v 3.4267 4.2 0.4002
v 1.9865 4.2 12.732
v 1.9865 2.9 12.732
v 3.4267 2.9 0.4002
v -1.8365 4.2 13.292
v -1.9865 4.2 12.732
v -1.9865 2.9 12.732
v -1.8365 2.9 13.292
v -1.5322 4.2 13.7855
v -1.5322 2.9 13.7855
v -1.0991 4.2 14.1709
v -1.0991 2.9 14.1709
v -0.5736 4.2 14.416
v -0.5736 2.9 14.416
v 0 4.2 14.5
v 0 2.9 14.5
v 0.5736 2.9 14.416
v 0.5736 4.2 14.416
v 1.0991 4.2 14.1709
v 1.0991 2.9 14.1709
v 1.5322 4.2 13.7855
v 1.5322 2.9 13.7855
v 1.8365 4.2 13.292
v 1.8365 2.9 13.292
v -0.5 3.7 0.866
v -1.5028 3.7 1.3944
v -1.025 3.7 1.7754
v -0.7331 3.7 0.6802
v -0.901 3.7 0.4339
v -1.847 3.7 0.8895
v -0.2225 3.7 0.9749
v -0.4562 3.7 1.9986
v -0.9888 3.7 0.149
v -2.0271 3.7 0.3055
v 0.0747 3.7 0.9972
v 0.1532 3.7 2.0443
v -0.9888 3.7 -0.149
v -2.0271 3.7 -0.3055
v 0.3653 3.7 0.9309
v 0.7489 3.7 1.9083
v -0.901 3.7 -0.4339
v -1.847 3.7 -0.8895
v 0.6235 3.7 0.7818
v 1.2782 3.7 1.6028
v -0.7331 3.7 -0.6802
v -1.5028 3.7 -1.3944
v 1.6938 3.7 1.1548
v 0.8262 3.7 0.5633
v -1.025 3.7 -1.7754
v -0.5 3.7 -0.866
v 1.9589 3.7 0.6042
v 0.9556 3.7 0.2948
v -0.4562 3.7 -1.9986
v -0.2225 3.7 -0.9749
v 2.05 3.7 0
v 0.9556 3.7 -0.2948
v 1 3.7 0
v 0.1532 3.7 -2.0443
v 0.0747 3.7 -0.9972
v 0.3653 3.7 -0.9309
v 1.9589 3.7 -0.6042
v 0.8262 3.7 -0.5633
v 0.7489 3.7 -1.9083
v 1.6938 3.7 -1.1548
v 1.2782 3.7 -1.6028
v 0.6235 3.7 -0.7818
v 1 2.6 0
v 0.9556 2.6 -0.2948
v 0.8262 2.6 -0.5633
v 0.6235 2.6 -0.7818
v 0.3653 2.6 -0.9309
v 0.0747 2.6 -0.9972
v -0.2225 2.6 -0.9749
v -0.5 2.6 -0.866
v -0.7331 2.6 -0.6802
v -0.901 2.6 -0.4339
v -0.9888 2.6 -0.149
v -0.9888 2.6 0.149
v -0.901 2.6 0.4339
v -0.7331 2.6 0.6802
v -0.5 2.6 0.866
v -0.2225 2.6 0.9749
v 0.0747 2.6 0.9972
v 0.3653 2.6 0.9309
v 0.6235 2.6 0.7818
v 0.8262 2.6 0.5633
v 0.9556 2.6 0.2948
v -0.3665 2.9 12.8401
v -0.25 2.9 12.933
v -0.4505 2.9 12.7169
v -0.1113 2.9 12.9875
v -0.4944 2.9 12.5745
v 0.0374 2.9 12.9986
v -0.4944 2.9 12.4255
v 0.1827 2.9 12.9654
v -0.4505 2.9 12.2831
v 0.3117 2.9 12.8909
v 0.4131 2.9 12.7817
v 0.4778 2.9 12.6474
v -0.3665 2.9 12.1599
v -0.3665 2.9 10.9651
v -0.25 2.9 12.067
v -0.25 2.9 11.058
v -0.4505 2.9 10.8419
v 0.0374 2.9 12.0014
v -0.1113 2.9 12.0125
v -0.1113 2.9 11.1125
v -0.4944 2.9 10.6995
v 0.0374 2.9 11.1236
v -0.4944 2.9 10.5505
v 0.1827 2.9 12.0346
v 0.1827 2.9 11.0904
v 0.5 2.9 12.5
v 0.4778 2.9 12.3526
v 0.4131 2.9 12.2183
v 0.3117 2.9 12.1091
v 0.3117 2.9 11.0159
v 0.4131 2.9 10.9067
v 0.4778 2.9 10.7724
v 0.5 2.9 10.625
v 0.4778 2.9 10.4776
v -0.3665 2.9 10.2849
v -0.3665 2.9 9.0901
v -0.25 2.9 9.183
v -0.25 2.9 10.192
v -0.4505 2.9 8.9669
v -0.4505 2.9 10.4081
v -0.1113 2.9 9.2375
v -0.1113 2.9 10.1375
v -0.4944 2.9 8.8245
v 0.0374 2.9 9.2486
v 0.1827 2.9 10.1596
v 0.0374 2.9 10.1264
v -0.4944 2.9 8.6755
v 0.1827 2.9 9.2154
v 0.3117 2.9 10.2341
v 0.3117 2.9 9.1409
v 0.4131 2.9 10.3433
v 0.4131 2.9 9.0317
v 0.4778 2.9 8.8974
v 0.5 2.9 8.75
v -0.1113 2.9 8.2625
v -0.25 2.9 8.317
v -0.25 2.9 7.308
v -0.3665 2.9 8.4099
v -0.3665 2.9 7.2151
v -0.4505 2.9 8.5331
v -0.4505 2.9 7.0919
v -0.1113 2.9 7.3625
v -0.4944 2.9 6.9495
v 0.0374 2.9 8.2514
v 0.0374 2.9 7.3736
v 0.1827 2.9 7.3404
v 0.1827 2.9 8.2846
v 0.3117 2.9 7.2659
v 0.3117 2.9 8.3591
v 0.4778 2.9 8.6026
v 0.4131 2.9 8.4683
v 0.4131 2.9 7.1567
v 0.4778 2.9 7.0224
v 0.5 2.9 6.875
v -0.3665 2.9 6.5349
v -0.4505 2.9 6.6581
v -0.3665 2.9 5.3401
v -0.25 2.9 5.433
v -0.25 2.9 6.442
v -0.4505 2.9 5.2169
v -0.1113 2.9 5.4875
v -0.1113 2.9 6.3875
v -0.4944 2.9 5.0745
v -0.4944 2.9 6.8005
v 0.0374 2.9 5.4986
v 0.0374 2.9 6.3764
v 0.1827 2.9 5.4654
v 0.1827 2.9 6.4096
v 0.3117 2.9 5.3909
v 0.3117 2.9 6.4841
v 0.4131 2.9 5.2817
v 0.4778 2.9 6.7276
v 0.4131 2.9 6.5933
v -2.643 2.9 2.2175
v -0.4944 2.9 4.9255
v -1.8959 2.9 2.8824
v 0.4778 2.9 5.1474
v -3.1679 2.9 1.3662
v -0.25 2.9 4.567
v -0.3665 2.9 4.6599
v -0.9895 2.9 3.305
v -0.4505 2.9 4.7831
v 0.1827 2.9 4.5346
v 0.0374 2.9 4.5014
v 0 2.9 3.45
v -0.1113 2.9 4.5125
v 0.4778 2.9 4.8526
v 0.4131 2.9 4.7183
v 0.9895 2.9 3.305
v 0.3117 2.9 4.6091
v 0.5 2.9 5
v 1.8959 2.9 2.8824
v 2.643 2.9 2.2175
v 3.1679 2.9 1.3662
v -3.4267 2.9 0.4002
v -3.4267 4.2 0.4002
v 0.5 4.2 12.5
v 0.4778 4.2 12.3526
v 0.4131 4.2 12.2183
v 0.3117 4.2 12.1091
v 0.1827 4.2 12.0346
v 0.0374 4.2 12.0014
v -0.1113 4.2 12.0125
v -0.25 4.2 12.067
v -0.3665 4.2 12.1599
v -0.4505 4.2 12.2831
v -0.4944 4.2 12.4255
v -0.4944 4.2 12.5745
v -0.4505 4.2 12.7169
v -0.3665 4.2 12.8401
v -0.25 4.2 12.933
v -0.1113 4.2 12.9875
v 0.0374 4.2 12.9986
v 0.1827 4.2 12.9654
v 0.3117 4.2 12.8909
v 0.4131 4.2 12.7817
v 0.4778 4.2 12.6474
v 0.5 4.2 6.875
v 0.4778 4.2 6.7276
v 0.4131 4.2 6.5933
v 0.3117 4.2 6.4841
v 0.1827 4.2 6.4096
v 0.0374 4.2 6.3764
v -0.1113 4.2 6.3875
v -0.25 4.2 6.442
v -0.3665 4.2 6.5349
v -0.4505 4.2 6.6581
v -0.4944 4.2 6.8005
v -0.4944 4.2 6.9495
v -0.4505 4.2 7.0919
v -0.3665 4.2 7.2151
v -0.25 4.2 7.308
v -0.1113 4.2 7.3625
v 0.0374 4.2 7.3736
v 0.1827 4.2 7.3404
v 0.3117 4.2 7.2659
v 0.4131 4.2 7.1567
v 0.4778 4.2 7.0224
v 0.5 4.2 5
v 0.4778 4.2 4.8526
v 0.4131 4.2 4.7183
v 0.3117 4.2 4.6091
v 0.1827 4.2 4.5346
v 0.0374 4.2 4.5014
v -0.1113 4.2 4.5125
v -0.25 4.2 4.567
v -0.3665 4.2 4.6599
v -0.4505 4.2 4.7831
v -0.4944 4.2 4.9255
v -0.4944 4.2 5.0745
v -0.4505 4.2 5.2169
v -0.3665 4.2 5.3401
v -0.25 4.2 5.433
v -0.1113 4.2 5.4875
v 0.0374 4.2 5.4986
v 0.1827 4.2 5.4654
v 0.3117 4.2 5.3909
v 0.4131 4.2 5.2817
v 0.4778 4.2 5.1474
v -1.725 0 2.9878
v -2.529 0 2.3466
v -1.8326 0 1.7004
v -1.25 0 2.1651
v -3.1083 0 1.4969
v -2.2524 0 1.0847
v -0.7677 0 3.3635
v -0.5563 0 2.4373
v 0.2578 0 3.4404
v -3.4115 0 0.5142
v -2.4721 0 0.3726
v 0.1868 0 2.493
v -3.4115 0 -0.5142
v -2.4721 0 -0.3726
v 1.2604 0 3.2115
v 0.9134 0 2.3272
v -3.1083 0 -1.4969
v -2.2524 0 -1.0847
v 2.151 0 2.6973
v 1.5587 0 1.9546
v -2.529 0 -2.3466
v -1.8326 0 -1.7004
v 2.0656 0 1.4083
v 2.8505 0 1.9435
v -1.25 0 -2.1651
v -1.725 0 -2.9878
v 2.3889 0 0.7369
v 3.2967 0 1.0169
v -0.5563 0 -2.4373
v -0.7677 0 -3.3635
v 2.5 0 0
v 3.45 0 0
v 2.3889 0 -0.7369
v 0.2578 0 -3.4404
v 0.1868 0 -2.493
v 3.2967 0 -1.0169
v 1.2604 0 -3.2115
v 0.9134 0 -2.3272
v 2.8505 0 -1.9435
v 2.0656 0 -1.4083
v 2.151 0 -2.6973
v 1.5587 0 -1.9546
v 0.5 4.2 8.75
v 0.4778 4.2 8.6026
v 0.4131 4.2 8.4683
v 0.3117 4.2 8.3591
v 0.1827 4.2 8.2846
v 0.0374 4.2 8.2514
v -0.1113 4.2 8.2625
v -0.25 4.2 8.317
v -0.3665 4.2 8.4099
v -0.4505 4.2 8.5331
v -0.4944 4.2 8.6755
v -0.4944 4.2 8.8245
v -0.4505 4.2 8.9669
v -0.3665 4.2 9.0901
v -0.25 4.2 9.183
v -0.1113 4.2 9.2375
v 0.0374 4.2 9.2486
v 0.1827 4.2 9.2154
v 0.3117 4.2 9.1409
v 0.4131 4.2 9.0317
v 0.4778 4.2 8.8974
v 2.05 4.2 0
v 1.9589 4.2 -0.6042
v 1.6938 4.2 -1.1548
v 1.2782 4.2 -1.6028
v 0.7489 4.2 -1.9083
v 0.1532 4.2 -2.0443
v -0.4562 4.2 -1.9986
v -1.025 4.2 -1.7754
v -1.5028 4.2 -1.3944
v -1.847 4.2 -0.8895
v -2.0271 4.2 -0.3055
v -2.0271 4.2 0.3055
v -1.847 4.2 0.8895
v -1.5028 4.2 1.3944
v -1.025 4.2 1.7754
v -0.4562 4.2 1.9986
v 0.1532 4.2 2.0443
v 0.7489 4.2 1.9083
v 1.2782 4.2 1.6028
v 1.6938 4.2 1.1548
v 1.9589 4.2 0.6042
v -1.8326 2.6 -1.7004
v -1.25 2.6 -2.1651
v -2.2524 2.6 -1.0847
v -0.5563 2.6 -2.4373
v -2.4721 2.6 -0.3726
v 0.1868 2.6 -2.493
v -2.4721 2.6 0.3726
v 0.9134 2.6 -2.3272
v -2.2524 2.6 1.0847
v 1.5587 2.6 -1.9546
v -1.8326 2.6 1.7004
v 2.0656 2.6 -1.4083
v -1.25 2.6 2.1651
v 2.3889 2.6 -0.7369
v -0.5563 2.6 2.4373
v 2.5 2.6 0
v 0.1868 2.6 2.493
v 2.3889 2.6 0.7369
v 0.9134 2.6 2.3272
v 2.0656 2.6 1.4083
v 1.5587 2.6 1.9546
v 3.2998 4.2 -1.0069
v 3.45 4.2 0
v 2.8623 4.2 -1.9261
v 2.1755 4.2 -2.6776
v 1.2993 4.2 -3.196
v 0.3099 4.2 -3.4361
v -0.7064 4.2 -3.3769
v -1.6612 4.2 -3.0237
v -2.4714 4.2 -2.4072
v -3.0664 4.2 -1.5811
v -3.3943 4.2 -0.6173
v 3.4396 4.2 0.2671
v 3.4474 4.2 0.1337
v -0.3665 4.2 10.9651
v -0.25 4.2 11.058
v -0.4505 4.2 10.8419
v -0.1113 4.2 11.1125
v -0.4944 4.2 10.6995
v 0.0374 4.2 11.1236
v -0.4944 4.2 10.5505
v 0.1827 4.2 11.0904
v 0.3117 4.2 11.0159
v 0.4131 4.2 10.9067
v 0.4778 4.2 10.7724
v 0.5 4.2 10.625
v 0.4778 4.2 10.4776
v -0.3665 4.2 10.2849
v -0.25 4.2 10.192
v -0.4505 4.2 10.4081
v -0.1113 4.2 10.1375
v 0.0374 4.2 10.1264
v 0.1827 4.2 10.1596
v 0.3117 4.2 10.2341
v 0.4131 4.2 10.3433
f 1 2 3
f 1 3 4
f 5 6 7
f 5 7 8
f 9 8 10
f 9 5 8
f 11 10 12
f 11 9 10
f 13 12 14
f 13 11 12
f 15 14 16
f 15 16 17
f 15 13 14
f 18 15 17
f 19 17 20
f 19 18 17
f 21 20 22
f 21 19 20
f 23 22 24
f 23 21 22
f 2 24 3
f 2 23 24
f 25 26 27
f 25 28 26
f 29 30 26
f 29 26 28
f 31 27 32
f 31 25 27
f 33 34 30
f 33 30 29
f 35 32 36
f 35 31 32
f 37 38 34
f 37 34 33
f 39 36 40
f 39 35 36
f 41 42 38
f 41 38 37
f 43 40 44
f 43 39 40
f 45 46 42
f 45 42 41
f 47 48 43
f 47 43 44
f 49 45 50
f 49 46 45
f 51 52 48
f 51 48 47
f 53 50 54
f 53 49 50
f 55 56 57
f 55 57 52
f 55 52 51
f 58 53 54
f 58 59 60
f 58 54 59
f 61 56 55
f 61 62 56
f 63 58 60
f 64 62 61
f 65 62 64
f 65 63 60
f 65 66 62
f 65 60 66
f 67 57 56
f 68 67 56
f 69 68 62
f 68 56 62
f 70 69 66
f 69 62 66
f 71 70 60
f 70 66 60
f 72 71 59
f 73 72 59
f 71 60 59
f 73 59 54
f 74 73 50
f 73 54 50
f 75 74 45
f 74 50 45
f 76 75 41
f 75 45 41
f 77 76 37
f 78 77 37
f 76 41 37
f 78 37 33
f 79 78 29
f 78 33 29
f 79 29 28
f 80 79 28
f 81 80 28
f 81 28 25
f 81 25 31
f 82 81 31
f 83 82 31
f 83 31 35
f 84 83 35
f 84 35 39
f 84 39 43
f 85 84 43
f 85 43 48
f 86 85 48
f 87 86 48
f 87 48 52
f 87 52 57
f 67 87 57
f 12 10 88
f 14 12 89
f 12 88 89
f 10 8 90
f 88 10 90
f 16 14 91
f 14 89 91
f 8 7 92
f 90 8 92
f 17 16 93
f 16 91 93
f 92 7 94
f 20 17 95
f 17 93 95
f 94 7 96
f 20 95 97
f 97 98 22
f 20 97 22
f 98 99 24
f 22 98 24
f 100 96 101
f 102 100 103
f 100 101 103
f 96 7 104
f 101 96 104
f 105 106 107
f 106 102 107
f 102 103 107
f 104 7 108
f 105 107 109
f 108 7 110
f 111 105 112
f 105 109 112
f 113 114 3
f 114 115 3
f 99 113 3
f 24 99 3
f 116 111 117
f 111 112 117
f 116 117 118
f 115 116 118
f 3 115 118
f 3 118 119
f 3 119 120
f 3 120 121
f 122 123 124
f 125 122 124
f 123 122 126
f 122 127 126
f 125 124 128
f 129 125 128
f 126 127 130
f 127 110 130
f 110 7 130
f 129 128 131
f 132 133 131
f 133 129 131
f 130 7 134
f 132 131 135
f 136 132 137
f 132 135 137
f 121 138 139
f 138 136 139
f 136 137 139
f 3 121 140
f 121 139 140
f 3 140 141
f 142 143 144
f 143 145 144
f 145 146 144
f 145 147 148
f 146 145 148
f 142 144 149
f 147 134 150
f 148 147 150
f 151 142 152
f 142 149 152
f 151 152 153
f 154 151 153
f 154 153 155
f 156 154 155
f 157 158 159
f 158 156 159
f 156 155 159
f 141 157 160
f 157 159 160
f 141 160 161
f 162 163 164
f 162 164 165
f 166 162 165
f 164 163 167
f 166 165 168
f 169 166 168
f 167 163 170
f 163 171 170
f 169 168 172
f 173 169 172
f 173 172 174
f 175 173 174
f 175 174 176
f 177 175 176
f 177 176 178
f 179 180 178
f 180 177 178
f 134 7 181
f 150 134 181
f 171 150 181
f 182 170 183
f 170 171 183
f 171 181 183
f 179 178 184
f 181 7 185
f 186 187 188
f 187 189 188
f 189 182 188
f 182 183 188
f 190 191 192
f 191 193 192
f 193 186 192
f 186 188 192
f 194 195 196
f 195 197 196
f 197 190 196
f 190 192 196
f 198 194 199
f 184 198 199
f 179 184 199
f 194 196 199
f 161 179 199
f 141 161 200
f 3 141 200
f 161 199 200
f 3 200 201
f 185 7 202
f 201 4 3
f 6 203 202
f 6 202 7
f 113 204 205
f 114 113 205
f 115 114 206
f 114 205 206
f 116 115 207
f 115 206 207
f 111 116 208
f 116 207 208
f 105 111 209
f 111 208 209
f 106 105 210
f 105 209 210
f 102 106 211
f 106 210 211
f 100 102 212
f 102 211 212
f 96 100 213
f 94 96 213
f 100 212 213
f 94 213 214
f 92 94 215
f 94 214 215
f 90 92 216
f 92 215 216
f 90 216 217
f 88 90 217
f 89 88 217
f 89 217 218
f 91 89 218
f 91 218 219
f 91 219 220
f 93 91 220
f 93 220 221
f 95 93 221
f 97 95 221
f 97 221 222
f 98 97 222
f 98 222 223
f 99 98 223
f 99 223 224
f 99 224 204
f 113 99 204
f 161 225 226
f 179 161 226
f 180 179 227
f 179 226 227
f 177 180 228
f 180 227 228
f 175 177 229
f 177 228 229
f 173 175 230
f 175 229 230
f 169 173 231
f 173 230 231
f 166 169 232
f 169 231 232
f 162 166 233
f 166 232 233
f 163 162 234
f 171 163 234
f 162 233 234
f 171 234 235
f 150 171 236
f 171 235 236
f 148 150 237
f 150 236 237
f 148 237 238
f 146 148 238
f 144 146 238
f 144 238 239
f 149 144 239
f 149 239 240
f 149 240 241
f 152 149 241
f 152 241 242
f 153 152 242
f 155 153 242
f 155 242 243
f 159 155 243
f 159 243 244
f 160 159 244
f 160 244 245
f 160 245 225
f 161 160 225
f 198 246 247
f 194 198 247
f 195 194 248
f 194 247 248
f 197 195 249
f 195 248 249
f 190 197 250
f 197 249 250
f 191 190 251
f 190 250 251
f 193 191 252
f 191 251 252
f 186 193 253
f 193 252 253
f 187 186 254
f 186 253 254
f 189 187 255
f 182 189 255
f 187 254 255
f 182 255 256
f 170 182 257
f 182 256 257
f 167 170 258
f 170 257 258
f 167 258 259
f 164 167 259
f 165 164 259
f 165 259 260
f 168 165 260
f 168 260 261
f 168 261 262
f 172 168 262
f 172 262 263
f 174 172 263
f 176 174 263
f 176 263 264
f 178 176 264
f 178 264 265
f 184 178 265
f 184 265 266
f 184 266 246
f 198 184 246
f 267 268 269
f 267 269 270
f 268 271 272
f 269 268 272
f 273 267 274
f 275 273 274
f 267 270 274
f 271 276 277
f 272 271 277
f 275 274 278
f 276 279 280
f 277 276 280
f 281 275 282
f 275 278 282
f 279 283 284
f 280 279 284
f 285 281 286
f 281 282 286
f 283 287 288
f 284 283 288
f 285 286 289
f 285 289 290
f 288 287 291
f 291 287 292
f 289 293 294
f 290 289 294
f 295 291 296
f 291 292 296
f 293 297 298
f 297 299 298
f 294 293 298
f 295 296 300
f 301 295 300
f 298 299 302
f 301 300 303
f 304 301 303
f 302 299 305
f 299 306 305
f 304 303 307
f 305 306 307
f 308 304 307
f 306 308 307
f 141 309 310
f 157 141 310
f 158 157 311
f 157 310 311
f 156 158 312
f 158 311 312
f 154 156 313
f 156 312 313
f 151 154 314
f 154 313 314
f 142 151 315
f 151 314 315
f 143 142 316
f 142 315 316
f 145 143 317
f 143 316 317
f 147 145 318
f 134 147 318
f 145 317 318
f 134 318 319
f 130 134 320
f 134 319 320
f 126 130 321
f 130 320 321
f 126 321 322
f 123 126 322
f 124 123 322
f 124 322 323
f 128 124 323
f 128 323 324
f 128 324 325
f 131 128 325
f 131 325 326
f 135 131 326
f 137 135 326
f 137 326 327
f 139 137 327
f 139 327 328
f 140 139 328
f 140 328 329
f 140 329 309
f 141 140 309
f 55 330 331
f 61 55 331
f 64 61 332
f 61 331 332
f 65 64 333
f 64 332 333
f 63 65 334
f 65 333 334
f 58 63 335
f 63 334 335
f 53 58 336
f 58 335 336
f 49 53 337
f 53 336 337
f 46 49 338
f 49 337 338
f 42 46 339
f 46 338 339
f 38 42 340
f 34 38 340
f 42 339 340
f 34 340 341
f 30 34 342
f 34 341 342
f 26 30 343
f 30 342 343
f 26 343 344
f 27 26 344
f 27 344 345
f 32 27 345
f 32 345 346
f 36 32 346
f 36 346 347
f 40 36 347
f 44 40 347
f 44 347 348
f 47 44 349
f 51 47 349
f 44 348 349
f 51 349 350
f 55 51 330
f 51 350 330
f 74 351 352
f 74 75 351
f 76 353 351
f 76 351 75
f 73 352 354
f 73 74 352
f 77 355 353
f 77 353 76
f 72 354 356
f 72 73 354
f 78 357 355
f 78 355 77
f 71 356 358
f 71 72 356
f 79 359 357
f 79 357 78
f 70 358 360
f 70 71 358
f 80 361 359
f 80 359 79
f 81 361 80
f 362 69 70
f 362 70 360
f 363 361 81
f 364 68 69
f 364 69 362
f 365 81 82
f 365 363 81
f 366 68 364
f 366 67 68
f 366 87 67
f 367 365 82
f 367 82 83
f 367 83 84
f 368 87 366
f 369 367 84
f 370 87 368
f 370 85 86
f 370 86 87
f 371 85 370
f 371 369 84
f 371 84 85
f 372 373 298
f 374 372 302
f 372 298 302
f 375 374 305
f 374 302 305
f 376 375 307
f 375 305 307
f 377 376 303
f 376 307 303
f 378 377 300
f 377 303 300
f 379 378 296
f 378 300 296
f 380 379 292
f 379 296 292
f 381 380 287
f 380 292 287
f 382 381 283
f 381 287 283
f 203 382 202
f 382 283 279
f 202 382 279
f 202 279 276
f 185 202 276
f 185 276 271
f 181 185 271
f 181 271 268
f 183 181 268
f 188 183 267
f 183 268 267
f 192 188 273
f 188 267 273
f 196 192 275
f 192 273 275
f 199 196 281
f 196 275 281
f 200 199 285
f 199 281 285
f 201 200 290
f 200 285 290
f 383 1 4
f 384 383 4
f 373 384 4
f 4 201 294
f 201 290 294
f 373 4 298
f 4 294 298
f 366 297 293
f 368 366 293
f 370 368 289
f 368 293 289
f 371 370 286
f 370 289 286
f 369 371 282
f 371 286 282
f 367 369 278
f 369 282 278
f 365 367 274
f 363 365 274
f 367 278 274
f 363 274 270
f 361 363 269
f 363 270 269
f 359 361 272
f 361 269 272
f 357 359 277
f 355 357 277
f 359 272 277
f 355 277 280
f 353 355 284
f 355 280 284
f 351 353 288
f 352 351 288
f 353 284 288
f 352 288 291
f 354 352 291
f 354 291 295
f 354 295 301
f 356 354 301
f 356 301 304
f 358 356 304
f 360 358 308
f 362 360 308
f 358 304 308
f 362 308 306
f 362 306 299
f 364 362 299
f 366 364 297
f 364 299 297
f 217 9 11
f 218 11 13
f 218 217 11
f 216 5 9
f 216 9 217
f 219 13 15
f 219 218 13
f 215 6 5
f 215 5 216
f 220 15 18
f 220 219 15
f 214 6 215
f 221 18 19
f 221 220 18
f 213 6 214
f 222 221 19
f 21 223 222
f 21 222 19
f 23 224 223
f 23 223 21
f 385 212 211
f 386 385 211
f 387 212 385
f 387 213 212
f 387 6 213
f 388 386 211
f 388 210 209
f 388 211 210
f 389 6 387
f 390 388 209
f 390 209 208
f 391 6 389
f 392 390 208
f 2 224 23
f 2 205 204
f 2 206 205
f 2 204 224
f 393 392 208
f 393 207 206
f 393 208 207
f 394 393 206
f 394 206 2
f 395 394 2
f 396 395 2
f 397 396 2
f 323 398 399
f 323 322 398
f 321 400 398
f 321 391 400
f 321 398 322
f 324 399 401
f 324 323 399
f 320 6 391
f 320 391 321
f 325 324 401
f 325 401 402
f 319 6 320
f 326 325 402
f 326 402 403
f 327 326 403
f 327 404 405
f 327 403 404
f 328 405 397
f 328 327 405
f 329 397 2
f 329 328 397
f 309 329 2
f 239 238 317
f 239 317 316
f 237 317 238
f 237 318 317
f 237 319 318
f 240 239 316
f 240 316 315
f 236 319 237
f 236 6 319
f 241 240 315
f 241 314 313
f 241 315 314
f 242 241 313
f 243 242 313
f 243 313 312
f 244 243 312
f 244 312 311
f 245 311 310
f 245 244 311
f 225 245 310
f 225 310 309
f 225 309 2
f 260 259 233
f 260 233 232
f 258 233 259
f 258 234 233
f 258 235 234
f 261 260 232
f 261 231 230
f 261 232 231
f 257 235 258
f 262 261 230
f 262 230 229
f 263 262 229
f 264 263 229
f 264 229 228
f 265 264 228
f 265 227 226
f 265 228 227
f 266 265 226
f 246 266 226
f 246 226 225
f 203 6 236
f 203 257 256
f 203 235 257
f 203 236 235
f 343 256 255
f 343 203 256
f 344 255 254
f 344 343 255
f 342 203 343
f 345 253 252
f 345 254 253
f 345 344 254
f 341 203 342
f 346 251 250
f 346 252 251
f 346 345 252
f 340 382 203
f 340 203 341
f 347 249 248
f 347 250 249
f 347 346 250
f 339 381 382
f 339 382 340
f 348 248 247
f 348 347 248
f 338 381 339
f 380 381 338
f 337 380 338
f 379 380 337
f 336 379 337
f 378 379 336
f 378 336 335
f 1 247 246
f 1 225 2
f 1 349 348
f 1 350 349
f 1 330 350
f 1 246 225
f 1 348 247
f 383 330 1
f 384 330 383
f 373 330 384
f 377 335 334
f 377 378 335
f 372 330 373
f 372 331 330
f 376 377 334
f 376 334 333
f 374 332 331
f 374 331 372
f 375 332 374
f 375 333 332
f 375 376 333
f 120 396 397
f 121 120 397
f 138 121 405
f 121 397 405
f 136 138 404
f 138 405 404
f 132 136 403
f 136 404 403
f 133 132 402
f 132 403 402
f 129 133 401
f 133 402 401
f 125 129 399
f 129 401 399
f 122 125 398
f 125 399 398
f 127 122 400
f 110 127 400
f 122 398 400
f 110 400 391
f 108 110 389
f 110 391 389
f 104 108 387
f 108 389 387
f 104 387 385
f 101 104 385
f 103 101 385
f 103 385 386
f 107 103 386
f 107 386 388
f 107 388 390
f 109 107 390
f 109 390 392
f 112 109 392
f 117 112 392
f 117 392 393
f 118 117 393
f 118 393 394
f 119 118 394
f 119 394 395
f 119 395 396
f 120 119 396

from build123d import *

# Parameters (mm, degrees)
SKETCH1_R           = 3.45
BOSS_EXTRUDE1_DEPTH = 4.2
BOSS_EXTRUDE2_DEPTH = 1.3
SKETCH2_R           = 2.05
CUT_EXTRUDE1_DEPTH  = 0.5
SKETCH4_R           = 0.5
CUT_EXTRUDE2_DEPTH  = 5.2
SKETCH5_R           = 1
CUT_EXTRUDE3_DEPTH  = 4.7
SKETCH6_R           = 2.5
CUT_EXTRUDE4_DEPTH  = 2.6


with BuildPart() as part:
    # Sketch1 → Boss-Extrude1 (new body)
    with BuildSketch(Plane(origin=(0, 0, 0), x_dir=(1, 0, 0), z_dir=(0, 1, 0))):
        Circle(SKETCH1_R)
    extrude(amount=BOSS_EXTRUDE1_DEPTH)

    # Sketch3 → Boss-Extrude2 (add)
    with BuildSketch(Plane(origin=(0, 4.2, 0), x_dir=(1, 0, 0), z_dir=(0, 1, 0))):
        with BuildLine():
            Line((-3.426709786, -0.4002), (-1.986498427, -12.732))
            ThreePointArc((-1.986498427, -12.732), (0, -14.5), (1.986498427, -12.732))
            Line((1.986498427, -12.732), (3.426709786, -0.4002))
            ThreePointArc((3.426709786, -0.4002), (0, 3.45), (-3.426709786, -0.4002))
        make_face()
    extrude(amount=-BOSS_EXTRUDE2_DEPTH)

    # Sketch2 → Cut-Extrude1 (cut)
    with BuildSketch(Plane(origin=(0, 4.2, 0), x_dir=(1, 0, 0), z_dir=(0, 1, 0))):
        Circle(SKETCH2_R)
    extrude(amount=-CUT_EXTRUDE1_DEPTH, mode=Mode.SUBTRACT)

    # Sketch4 → Cut-Extrude2 (cut, through all)
    with BuildSketch(Plane(origin=(0, 4.2, 0), x_dir=(1, 0, 0), z_dir=(0, 1, 0))):
        with Locations((0, -12.5)):
            Circle(SKETCH4_R)
        with Locations((0, -10.625)):
            Circle(SKETCH4_R)
        with Locations((0, -8.75)):
            Circle(SKETCH4_R)
        with Locations((0, -6.875)):
            Circle(SKETCH4_R)
        with Locations((0, -5)):
            Circle(SKETCH4_R)
    extrude(amount=-CUT_EXTRUDE2_DEPTH, mode=Mode.SUBTRACT)

    # Sketch5 → Cut-Extrude3 (cut, through all)
    with BuildSketch(Plane(origin=(0, 3.7, 0), x_dir=(1, 0, 0), z_dir=(0, 1, 0))):
        Circle(SKETCH5_R)
    extrude(amount=-CUT_EXTRUDE3_DEPTH, mode=Mode.SUBTRACT)

    # Sketch6 → Cut-Extrude4 (cut)
    with BuildSketch(Plane.XZ):
        Circle(SKETCH6_R)
    extrude(amount=-CUT_EXTRUDE4_DEPTH, mode=Mode.SUBTRACT)


solid = part.part
